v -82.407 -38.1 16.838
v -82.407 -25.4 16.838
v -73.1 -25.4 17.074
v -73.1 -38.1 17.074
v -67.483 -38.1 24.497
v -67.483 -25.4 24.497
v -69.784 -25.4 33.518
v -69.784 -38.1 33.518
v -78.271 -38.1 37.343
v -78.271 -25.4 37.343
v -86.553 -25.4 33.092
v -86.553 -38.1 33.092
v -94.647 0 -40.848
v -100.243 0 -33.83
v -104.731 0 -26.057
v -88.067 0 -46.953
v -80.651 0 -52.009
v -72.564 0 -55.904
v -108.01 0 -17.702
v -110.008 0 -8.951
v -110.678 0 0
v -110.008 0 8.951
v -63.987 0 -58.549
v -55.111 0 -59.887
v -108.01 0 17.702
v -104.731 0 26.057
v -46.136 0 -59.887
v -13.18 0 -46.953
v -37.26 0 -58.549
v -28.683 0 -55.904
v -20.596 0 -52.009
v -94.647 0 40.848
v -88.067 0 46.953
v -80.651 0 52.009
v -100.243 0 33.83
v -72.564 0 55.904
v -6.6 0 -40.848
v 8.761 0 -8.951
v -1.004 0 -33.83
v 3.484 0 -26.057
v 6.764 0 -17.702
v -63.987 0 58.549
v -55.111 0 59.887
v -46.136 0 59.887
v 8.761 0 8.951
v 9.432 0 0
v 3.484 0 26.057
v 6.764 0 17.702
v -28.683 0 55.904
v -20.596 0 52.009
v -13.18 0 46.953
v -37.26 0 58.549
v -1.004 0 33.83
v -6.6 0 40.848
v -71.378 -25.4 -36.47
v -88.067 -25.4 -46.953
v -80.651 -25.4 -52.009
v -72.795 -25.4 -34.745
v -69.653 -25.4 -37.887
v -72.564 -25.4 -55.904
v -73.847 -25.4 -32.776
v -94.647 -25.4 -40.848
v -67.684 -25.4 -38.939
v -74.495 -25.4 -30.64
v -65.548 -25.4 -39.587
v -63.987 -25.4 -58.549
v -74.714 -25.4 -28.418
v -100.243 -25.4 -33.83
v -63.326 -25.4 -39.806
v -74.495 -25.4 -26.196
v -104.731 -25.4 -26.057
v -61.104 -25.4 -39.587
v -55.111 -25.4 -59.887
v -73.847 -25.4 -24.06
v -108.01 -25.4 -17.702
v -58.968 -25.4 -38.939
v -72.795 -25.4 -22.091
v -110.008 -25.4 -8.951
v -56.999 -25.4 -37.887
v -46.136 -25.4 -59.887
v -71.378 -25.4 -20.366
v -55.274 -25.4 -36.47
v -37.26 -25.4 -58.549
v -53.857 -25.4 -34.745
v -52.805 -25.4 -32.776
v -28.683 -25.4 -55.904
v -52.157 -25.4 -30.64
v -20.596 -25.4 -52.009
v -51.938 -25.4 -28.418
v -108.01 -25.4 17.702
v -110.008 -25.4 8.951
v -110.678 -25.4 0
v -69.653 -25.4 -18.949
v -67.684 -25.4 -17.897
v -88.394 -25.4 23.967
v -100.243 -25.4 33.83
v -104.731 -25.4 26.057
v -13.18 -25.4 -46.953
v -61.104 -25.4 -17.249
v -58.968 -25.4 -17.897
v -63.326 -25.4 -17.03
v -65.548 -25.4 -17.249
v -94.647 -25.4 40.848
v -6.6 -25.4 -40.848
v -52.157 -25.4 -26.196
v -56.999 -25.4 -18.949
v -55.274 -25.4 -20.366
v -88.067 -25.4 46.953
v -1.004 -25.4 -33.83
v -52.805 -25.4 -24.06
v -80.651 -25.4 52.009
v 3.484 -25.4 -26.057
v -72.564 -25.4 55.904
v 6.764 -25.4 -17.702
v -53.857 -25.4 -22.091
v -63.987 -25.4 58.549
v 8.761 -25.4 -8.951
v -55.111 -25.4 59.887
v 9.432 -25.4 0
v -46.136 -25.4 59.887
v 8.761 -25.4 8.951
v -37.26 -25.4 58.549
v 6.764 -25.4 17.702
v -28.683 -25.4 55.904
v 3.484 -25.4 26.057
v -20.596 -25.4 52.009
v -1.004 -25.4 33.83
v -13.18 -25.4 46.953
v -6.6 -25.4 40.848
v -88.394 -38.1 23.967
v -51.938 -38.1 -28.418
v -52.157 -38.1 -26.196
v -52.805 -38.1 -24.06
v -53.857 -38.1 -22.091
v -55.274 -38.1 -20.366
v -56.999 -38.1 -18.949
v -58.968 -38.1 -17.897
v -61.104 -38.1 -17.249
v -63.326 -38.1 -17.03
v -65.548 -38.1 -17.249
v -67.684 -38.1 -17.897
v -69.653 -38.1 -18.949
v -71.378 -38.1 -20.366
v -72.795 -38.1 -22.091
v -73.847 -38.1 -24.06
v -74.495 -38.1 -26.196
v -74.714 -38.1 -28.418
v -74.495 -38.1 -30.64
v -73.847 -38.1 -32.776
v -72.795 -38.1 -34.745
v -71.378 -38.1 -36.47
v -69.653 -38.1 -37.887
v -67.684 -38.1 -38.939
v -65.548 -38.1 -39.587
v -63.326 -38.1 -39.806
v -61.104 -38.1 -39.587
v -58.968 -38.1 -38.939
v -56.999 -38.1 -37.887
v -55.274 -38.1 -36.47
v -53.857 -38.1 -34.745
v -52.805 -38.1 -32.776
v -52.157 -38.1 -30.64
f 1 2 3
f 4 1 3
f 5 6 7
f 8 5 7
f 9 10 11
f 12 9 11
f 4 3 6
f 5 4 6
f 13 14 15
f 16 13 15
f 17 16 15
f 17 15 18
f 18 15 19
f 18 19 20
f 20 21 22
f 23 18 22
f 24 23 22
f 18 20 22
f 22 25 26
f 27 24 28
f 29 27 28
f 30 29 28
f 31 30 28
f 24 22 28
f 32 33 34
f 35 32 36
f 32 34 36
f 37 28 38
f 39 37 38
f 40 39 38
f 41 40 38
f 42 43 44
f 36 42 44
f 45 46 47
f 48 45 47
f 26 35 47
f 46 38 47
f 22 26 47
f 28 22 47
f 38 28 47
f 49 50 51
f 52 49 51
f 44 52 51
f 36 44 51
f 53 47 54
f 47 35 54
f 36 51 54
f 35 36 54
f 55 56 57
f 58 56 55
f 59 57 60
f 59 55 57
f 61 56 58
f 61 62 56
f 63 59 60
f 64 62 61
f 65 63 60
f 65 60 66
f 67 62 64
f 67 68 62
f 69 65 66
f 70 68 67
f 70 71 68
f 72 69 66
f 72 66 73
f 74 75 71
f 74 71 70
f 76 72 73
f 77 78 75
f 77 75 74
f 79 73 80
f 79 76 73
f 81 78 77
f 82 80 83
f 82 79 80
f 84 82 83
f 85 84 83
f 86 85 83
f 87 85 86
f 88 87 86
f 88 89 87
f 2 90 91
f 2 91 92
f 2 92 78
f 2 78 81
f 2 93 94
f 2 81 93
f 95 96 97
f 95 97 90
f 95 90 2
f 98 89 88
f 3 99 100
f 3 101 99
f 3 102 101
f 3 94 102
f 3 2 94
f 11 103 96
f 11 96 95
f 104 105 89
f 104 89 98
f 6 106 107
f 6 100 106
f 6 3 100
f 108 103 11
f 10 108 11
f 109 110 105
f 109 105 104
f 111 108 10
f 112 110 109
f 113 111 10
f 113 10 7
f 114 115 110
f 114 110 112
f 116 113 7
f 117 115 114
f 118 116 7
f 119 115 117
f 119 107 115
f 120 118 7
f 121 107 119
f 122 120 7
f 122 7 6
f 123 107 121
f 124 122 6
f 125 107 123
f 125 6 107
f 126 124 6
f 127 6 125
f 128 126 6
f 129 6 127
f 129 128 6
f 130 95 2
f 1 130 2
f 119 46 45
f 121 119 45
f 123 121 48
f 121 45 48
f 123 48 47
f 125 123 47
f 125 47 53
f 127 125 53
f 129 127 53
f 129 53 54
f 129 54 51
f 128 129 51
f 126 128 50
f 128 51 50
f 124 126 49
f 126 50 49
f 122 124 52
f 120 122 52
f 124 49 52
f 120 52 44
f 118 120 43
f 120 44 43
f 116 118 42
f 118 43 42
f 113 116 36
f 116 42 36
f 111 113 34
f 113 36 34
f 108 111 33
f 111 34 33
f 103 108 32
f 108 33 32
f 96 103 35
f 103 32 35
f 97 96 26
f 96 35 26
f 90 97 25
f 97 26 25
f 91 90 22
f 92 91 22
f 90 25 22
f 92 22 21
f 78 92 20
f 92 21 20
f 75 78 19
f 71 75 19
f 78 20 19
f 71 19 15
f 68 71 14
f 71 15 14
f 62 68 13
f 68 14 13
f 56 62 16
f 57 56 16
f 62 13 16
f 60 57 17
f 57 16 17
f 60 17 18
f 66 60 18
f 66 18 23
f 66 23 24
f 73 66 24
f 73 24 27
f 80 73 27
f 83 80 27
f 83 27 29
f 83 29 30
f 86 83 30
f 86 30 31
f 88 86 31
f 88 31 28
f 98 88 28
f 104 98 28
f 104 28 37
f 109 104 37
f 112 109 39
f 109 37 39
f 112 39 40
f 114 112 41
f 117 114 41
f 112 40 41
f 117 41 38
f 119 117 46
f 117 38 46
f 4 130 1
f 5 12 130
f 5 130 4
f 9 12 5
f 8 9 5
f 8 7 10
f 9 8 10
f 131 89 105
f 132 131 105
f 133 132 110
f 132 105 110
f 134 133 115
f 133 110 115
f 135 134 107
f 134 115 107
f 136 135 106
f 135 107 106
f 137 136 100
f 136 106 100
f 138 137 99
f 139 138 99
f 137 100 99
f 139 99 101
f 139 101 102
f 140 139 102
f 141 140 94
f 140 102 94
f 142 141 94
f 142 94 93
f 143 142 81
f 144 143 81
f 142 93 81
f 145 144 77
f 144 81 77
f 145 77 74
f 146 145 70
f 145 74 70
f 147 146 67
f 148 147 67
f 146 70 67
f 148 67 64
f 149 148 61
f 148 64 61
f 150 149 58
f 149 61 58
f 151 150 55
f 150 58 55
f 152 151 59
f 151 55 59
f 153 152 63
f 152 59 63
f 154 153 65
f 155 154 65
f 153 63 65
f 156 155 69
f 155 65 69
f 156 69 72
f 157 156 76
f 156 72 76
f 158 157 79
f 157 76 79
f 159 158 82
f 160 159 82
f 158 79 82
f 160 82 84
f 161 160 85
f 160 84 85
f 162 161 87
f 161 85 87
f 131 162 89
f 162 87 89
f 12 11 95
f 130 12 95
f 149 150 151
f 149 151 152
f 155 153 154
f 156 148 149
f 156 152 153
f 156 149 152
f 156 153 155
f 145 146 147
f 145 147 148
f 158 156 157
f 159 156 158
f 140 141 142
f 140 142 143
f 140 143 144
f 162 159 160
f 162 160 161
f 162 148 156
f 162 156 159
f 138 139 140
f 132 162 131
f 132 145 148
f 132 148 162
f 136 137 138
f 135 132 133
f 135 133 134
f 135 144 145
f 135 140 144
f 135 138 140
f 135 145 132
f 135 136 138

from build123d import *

# Parameters (mm, degrees)
F0_R     = 60.055036
F1_DEPTH = 25.4
F3_DEPTH = 12.7
F4_R     = 11.387781
F5_DEPTH = 12.7


with BuildPart() as f1:
    # F0 (on Front) → F1 (new body)
    with BuildSketch(Plane.XZ):
        with Locations((-50.623428, 0)):
            Circle(F0_R)
    extrude(amount=F1_DEPTH)

    # F2 (on face) → F3 (join)
    with BuildSketch(Plane.XZ.offset(25.4)):
        Polygon((-73.100491, 17.074037), (-67.482652, 24.497394), (-69.7838, 33.517985), (-78.271125, 37.343121), (-86.553497, 33.092397), (-88.394122, 23.966694), (-82.406971, 16.837853), align=None)
    extrude(amount=F3_DEPTH)

    # F4 (on face) → F5 (join)
    with BuildSketch(Plane.XZ.offset(25.4)):
        with Locations((-63.326038, -28.41799)):
            Circle(F4_R)
    extrude(amount=F5_DEPTH)


solid = f1.part
